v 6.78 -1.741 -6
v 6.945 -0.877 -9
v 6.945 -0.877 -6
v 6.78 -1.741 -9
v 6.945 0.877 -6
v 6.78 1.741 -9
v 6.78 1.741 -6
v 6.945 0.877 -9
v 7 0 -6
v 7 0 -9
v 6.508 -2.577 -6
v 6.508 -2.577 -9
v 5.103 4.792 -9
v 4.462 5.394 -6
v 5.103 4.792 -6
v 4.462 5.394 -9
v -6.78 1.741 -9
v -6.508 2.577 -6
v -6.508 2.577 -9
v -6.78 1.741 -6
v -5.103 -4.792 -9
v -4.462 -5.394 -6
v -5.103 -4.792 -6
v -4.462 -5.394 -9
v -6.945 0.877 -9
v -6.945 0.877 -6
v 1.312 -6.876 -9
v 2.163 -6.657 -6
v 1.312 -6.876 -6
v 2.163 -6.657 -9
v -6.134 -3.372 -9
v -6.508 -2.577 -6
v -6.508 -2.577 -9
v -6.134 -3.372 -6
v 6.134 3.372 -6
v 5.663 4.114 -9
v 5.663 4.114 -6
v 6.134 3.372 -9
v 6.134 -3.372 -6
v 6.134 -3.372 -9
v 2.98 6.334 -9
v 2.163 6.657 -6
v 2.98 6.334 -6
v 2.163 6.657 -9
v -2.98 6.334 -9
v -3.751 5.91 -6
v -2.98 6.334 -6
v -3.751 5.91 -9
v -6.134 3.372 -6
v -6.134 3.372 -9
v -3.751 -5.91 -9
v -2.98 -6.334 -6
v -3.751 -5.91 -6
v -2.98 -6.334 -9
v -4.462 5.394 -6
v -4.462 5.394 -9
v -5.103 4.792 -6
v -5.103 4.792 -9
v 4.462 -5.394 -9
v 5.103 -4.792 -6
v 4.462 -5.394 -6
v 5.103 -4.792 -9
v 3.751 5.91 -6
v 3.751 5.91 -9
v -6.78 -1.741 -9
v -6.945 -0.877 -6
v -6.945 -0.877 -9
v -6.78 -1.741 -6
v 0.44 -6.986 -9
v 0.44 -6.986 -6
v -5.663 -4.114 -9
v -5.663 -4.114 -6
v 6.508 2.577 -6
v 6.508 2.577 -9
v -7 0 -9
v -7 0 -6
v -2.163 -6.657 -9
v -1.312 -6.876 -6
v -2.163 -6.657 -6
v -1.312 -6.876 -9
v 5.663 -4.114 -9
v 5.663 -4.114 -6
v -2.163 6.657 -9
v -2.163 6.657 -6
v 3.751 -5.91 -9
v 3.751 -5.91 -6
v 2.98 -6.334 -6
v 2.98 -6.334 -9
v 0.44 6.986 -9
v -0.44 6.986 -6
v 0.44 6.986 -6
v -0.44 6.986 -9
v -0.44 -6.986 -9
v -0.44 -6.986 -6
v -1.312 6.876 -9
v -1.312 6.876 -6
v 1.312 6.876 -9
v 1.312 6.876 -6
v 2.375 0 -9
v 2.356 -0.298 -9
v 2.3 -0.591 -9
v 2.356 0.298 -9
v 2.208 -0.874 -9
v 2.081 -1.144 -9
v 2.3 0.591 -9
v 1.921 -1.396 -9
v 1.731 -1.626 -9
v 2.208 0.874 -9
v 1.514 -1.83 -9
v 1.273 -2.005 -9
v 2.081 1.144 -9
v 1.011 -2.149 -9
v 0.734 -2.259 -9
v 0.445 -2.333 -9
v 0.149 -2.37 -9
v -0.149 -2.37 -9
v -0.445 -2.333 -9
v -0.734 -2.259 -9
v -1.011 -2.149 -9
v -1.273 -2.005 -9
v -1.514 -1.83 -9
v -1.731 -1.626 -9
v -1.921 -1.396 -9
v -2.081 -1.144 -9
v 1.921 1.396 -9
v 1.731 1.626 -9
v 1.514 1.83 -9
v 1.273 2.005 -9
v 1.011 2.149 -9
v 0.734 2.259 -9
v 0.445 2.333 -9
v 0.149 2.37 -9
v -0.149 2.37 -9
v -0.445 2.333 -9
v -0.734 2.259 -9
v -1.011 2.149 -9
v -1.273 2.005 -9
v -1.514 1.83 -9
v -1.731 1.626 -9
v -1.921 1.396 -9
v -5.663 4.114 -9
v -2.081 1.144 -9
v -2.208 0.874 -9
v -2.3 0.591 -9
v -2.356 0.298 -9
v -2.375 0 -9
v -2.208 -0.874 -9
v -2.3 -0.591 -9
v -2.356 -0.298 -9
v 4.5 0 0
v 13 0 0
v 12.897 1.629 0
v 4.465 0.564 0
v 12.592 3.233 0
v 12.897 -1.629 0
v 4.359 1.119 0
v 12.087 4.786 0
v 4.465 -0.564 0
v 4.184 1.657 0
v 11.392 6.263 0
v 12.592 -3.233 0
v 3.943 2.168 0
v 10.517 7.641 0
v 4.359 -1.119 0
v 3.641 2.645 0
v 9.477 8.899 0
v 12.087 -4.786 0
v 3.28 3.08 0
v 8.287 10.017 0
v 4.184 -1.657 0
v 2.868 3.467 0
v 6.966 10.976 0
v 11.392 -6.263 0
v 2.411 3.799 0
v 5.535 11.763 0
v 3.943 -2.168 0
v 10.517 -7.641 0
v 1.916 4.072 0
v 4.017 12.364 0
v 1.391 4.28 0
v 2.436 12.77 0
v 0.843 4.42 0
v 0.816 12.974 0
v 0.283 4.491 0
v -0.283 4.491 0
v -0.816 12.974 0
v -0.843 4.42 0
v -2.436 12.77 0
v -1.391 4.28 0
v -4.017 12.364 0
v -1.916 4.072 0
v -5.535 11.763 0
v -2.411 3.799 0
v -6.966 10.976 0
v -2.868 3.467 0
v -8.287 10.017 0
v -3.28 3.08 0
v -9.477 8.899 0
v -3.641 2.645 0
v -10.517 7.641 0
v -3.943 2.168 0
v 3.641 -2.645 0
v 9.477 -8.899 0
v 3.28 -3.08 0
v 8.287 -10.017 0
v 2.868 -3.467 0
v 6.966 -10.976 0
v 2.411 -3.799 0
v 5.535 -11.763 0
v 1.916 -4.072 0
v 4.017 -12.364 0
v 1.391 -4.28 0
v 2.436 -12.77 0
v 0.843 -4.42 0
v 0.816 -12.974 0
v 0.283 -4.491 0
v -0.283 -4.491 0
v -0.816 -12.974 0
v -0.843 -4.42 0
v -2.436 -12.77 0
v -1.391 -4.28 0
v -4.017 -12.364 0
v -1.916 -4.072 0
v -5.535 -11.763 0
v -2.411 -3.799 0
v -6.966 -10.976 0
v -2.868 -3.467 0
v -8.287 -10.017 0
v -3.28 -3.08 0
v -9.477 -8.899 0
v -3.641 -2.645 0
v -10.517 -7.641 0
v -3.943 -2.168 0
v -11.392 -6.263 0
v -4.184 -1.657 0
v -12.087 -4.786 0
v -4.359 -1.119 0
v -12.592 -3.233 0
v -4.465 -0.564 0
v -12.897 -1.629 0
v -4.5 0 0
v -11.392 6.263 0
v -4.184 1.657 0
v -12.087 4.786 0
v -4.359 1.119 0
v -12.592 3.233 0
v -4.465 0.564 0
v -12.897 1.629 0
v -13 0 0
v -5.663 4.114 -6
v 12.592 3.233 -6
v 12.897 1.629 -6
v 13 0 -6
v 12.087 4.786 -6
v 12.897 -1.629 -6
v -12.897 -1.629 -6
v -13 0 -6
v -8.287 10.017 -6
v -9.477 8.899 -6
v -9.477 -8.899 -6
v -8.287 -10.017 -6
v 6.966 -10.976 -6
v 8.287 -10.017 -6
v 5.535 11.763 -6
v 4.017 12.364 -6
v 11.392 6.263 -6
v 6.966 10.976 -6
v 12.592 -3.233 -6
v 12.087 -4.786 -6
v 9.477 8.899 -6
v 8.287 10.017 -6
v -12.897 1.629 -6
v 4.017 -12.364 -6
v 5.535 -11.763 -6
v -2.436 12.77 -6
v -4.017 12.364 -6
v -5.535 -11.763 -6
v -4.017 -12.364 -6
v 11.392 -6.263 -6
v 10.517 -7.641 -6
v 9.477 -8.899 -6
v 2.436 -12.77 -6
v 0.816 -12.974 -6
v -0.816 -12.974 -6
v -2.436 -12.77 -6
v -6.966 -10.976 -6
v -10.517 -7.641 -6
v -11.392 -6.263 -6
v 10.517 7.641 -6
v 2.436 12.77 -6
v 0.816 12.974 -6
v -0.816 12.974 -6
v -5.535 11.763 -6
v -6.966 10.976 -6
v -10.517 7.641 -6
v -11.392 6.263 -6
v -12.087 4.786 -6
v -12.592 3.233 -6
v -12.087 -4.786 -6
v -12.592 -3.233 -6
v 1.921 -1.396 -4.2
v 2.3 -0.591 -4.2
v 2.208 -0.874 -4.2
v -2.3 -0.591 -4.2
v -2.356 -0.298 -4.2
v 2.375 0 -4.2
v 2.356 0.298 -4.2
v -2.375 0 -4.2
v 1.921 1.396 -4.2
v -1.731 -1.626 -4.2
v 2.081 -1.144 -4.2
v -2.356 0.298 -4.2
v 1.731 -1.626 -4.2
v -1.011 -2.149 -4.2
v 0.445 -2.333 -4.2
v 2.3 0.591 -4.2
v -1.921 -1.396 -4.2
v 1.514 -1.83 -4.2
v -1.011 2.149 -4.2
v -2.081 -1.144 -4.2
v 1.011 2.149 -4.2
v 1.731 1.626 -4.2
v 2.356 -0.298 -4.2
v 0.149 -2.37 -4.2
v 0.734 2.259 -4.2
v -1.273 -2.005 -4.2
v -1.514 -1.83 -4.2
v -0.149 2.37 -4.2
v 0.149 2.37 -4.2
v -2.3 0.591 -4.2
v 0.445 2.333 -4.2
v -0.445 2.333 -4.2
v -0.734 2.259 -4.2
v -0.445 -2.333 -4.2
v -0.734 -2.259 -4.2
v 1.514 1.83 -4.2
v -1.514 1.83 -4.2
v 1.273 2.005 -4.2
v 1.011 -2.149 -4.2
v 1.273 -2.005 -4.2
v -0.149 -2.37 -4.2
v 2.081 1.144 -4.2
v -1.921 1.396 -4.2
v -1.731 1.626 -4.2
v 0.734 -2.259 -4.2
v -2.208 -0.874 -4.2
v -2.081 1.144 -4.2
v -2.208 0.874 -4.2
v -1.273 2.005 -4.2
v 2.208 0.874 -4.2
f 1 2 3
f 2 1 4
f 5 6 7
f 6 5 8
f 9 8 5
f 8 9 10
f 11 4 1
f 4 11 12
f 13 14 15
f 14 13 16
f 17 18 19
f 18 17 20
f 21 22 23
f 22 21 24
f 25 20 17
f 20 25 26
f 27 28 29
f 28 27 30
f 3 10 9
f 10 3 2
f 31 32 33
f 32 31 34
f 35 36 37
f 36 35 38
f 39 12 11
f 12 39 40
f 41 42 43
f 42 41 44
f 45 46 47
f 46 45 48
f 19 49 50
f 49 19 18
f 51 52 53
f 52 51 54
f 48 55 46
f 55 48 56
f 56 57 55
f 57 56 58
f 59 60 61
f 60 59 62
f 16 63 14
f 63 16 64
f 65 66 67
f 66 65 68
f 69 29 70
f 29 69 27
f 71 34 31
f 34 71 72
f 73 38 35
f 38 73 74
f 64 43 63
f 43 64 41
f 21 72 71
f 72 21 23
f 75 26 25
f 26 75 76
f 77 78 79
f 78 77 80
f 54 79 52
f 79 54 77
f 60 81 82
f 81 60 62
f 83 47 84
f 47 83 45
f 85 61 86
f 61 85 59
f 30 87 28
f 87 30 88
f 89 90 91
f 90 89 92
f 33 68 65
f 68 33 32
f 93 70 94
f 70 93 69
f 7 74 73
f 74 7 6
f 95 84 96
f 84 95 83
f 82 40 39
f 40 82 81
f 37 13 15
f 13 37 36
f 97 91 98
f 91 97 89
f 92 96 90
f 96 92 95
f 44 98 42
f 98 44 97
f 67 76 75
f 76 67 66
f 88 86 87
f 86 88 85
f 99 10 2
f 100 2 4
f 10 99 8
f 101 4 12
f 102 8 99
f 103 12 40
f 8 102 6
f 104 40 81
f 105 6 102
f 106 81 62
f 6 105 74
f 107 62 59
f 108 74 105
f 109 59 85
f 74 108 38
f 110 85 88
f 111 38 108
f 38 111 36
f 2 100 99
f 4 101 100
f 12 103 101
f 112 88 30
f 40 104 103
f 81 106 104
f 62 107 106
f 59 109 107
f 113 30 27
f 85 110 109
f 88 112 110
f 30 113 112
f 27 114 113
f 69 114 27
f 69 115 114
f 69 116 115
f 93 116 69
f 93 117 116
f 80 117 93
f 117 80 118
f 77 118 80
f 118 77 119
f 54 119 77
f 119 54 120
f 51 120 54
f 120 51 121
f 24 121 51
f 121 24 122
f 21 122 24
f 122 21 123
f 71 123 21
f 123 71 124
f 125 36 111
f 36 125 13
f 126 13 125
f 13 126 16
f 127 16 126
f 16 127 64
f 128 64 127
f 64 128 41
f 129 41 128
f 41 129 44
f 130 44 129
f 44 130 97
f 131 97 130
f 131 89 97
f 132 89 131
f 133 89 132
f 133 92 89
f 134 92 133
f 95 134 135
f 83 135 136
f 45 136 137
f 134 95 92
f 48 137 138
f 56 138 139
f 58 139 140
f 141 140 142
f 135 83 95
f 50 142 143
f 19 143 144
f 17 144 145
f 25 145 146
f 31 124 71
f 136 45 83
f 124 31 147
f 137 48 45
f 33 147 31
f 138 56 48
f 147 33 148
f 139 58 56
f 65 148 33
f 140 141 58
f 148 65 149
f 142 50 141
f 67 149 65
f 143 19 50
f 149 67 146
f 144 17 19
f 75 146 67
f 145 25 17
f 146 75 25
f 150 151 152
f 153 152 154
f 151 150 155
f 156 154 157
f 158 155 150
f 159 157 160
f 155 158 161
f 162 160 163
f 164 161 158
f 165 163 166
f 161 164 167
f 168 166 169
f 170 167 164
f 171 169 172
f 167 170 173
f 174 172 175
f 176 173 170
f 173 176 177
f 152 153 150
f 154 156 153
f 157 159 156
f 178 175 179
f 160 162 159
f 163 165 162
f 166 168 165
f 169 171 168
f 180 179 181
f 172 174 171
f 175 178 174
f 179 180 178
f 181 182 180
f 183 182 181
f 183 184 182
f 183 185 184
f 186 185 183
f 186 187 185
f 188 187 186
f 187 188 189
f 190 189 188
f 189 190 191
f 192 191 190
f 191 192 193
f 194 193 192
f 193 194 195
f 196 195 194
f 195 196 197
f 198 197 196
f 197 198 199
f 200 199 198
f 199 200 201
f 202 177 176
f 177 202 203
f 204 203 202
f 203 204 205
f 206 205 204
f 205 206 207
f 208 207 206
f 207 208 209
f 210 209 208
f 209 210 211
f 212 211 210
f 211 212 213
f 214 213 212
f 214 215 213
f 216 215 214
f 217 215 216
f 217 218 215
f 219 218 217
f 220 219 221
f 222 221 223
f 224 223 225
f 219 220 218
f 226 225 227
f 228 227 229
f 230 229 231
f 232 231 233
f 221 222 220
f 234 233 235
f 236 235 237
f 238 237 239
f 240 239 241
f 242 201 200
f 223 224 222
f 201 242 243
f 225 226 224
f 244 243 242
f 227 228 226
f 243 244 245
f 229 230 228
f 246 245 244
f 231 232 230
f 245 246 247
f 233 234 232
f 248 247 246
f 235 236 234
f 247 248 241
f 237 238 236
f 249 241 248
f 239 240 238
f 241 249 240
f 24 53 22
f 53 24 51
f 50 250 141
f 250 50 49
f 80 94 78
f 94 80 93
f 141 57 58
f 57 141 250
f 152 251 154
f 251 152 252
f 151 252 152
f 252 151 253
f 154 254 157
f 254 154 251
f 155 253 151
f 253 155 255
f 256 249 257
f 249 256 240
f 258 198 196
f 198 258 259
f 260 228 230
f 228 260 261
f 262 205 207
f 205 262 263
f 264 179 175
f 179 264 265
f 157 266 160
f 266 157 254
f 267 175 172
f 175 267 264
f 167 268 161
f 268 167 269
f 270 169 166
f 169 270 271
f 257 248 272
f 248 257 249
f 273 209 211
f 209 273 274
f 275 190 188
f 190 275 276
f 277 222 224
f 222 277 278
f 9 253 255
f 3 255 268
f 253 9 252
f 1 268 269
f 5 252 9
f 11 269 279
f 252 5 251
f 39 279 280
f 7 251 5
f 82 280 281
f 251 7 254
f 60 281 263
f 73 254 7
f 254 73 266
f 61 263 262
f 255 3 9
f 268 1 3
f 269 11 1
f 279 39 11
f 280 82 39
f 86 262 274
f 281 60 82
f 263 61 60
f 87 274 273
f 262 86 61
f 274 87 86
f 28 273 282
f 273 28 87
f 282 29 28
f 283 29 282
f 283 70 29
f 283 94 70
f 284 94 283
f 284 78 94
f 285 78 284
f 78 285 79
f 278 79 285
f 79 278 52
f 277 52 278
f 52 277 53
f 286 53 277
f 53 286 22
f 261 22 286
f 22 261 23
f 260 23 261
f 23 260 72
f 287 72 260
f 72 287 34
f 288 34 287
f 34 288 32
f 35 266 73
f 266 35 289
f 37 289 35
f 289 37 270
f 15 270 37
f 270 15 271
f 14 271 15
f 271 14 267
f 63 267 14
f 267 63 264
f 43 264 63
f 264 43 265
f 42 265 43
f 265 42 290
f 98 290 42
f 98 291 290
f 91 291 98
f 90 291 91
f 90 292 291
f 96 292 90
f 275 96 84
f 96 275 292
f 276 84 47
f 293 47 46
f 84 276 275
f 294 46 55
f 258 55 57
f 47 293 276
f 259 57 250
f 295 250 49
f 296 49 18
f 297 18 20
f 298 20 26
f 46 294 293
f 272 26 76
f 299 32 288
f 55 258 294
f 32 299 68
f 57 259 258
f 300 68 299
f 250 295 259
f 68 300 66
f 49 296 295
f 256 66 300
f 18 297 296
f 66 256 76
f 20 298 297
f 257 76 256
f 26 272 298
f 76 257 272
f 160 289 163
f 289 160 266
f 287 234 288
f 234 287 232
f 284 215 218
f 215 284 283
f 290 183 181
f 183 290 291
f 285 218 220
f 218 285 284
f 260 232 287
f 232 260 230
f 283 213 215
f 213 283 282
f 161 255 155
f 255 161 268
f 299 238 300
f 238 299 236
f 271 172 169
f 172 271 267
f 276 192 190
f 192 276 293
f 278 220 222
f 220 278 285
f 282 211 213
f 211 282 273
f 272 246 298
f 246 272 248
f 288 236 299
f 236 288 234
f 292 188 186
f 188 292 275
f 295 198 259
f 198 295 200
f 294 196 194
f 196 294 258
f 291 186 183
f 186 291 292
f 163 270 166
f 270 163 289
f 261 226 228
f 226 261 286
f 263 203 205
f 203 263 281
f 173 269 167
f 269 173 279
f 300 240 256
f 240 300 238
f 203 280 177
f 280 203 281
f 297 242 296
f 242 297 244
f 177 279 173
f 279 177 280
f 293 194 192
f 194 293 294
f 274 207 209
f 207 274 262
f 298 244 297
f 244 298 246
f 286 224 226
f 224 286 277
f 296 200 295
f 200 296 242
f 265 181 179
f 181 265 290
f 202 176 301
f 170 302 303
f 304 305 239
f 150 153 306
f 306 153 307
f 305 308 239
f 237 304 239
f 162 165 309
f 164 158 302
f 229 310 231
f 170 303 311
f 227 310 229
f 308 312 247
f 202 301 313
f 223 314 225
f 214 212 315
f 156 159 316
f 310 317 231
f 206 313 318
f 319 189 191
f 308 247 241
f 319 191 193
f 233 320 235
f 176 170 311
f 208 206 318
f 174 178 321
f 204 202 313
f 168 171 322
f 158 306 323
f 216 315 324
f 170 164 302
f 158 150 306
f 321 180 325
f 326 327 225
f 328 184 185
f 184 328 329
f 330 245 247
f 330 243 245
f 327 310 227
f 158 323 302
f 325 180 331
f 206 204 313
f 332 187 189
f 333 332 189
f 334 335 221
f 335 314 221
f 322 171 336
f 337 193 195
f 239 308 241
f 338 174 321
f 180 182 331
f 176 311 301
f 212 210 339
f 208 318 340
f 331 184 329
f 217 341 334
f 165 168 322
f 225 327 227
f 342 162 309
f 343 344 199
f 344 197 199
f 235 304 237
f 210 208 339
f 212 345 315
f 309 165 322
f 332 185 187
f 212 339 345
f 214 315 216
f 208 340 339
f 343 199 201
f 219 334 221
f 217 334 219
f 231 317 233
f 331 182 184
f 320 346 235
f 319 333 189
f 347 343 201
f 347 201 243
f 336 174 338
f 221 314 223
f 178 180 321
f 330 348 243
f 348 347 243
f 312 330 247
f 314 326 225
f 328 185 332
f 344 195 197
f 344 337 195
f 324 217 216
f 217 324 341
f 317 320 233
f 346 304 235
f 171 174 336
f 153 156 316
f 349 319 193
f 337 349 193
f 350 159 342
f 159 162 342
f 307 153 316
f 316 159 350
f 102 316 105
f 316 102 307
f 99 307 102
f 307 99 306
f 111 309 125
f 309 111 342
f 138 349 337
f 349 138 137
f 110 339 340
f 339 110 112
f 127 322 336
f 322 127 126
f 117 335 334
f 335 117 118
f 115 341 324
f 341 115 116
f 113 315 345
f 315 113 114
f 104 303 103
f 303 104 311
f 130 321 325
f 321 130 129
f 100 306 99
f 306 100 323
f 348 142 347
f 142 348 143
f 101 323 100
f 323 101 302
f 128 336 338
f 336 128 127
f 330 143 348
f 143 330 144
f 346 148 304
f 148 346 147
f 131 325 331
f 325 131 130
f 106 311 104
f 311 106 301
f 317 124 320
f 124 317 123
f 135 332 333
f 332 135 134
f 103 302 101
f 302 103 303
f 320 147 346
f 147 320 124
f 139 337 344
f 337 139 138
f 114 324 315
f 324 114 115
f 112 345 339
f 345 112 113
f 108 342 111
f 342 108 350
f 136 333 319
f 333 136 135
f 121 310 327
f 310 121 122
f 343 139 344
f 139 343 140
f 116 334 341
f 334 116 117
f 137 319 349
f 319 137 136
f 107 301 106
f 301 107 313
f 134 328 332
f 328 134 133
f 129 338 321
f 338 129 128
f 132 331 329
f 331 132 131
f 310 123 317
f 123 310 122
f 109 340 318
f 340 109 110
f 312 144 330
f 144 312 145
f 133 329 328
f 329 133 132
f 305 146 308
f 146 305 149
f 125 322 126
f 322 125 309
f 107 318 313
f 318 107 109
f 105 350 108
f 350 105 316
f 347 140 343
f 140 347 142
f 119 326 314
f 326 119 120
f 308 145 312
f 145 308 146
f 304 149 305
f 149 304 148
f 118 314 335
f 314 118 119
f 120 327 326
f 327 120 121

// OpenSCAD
$fn = 50;


difference() {
	union() {
		translate(v = [0, 0, -9.0000000000]) {
			cylinder(h = 9, r = 7.0000000000);
		}
		translate(v = [0, 0, -6.0000000000]) {
			cylinder(h = 6, r = 13.0000000000);
		}
	}
	union() {
		translate(v = [0, 0, 0]) {
			rotate(a = [0, 0, 0]) {
				difference() {
					union() {
						#translate(v = [0, 0, -9.0000000000]) {
							cylinder(h = 9, r = 2.2500000000);
						}
						#translate(v = [0, 0, -4.2000000000]) {
							cylinder(h = 4.2000000000, r = 7.0000000000, r1 = 2.3750000000, r2 = 4.5000000000);
						}
						#translate(v = [0, 0, -9.0000000000]) {
							cylinder(h = 9, r = 2.3750000000);
						}
						#translate(v = [0, 0, -9.0000000000]) {
							cylinder(h = 9, r = 2.2500000000);
						}
					}
					union();
				}
			}
		}
	}
}
